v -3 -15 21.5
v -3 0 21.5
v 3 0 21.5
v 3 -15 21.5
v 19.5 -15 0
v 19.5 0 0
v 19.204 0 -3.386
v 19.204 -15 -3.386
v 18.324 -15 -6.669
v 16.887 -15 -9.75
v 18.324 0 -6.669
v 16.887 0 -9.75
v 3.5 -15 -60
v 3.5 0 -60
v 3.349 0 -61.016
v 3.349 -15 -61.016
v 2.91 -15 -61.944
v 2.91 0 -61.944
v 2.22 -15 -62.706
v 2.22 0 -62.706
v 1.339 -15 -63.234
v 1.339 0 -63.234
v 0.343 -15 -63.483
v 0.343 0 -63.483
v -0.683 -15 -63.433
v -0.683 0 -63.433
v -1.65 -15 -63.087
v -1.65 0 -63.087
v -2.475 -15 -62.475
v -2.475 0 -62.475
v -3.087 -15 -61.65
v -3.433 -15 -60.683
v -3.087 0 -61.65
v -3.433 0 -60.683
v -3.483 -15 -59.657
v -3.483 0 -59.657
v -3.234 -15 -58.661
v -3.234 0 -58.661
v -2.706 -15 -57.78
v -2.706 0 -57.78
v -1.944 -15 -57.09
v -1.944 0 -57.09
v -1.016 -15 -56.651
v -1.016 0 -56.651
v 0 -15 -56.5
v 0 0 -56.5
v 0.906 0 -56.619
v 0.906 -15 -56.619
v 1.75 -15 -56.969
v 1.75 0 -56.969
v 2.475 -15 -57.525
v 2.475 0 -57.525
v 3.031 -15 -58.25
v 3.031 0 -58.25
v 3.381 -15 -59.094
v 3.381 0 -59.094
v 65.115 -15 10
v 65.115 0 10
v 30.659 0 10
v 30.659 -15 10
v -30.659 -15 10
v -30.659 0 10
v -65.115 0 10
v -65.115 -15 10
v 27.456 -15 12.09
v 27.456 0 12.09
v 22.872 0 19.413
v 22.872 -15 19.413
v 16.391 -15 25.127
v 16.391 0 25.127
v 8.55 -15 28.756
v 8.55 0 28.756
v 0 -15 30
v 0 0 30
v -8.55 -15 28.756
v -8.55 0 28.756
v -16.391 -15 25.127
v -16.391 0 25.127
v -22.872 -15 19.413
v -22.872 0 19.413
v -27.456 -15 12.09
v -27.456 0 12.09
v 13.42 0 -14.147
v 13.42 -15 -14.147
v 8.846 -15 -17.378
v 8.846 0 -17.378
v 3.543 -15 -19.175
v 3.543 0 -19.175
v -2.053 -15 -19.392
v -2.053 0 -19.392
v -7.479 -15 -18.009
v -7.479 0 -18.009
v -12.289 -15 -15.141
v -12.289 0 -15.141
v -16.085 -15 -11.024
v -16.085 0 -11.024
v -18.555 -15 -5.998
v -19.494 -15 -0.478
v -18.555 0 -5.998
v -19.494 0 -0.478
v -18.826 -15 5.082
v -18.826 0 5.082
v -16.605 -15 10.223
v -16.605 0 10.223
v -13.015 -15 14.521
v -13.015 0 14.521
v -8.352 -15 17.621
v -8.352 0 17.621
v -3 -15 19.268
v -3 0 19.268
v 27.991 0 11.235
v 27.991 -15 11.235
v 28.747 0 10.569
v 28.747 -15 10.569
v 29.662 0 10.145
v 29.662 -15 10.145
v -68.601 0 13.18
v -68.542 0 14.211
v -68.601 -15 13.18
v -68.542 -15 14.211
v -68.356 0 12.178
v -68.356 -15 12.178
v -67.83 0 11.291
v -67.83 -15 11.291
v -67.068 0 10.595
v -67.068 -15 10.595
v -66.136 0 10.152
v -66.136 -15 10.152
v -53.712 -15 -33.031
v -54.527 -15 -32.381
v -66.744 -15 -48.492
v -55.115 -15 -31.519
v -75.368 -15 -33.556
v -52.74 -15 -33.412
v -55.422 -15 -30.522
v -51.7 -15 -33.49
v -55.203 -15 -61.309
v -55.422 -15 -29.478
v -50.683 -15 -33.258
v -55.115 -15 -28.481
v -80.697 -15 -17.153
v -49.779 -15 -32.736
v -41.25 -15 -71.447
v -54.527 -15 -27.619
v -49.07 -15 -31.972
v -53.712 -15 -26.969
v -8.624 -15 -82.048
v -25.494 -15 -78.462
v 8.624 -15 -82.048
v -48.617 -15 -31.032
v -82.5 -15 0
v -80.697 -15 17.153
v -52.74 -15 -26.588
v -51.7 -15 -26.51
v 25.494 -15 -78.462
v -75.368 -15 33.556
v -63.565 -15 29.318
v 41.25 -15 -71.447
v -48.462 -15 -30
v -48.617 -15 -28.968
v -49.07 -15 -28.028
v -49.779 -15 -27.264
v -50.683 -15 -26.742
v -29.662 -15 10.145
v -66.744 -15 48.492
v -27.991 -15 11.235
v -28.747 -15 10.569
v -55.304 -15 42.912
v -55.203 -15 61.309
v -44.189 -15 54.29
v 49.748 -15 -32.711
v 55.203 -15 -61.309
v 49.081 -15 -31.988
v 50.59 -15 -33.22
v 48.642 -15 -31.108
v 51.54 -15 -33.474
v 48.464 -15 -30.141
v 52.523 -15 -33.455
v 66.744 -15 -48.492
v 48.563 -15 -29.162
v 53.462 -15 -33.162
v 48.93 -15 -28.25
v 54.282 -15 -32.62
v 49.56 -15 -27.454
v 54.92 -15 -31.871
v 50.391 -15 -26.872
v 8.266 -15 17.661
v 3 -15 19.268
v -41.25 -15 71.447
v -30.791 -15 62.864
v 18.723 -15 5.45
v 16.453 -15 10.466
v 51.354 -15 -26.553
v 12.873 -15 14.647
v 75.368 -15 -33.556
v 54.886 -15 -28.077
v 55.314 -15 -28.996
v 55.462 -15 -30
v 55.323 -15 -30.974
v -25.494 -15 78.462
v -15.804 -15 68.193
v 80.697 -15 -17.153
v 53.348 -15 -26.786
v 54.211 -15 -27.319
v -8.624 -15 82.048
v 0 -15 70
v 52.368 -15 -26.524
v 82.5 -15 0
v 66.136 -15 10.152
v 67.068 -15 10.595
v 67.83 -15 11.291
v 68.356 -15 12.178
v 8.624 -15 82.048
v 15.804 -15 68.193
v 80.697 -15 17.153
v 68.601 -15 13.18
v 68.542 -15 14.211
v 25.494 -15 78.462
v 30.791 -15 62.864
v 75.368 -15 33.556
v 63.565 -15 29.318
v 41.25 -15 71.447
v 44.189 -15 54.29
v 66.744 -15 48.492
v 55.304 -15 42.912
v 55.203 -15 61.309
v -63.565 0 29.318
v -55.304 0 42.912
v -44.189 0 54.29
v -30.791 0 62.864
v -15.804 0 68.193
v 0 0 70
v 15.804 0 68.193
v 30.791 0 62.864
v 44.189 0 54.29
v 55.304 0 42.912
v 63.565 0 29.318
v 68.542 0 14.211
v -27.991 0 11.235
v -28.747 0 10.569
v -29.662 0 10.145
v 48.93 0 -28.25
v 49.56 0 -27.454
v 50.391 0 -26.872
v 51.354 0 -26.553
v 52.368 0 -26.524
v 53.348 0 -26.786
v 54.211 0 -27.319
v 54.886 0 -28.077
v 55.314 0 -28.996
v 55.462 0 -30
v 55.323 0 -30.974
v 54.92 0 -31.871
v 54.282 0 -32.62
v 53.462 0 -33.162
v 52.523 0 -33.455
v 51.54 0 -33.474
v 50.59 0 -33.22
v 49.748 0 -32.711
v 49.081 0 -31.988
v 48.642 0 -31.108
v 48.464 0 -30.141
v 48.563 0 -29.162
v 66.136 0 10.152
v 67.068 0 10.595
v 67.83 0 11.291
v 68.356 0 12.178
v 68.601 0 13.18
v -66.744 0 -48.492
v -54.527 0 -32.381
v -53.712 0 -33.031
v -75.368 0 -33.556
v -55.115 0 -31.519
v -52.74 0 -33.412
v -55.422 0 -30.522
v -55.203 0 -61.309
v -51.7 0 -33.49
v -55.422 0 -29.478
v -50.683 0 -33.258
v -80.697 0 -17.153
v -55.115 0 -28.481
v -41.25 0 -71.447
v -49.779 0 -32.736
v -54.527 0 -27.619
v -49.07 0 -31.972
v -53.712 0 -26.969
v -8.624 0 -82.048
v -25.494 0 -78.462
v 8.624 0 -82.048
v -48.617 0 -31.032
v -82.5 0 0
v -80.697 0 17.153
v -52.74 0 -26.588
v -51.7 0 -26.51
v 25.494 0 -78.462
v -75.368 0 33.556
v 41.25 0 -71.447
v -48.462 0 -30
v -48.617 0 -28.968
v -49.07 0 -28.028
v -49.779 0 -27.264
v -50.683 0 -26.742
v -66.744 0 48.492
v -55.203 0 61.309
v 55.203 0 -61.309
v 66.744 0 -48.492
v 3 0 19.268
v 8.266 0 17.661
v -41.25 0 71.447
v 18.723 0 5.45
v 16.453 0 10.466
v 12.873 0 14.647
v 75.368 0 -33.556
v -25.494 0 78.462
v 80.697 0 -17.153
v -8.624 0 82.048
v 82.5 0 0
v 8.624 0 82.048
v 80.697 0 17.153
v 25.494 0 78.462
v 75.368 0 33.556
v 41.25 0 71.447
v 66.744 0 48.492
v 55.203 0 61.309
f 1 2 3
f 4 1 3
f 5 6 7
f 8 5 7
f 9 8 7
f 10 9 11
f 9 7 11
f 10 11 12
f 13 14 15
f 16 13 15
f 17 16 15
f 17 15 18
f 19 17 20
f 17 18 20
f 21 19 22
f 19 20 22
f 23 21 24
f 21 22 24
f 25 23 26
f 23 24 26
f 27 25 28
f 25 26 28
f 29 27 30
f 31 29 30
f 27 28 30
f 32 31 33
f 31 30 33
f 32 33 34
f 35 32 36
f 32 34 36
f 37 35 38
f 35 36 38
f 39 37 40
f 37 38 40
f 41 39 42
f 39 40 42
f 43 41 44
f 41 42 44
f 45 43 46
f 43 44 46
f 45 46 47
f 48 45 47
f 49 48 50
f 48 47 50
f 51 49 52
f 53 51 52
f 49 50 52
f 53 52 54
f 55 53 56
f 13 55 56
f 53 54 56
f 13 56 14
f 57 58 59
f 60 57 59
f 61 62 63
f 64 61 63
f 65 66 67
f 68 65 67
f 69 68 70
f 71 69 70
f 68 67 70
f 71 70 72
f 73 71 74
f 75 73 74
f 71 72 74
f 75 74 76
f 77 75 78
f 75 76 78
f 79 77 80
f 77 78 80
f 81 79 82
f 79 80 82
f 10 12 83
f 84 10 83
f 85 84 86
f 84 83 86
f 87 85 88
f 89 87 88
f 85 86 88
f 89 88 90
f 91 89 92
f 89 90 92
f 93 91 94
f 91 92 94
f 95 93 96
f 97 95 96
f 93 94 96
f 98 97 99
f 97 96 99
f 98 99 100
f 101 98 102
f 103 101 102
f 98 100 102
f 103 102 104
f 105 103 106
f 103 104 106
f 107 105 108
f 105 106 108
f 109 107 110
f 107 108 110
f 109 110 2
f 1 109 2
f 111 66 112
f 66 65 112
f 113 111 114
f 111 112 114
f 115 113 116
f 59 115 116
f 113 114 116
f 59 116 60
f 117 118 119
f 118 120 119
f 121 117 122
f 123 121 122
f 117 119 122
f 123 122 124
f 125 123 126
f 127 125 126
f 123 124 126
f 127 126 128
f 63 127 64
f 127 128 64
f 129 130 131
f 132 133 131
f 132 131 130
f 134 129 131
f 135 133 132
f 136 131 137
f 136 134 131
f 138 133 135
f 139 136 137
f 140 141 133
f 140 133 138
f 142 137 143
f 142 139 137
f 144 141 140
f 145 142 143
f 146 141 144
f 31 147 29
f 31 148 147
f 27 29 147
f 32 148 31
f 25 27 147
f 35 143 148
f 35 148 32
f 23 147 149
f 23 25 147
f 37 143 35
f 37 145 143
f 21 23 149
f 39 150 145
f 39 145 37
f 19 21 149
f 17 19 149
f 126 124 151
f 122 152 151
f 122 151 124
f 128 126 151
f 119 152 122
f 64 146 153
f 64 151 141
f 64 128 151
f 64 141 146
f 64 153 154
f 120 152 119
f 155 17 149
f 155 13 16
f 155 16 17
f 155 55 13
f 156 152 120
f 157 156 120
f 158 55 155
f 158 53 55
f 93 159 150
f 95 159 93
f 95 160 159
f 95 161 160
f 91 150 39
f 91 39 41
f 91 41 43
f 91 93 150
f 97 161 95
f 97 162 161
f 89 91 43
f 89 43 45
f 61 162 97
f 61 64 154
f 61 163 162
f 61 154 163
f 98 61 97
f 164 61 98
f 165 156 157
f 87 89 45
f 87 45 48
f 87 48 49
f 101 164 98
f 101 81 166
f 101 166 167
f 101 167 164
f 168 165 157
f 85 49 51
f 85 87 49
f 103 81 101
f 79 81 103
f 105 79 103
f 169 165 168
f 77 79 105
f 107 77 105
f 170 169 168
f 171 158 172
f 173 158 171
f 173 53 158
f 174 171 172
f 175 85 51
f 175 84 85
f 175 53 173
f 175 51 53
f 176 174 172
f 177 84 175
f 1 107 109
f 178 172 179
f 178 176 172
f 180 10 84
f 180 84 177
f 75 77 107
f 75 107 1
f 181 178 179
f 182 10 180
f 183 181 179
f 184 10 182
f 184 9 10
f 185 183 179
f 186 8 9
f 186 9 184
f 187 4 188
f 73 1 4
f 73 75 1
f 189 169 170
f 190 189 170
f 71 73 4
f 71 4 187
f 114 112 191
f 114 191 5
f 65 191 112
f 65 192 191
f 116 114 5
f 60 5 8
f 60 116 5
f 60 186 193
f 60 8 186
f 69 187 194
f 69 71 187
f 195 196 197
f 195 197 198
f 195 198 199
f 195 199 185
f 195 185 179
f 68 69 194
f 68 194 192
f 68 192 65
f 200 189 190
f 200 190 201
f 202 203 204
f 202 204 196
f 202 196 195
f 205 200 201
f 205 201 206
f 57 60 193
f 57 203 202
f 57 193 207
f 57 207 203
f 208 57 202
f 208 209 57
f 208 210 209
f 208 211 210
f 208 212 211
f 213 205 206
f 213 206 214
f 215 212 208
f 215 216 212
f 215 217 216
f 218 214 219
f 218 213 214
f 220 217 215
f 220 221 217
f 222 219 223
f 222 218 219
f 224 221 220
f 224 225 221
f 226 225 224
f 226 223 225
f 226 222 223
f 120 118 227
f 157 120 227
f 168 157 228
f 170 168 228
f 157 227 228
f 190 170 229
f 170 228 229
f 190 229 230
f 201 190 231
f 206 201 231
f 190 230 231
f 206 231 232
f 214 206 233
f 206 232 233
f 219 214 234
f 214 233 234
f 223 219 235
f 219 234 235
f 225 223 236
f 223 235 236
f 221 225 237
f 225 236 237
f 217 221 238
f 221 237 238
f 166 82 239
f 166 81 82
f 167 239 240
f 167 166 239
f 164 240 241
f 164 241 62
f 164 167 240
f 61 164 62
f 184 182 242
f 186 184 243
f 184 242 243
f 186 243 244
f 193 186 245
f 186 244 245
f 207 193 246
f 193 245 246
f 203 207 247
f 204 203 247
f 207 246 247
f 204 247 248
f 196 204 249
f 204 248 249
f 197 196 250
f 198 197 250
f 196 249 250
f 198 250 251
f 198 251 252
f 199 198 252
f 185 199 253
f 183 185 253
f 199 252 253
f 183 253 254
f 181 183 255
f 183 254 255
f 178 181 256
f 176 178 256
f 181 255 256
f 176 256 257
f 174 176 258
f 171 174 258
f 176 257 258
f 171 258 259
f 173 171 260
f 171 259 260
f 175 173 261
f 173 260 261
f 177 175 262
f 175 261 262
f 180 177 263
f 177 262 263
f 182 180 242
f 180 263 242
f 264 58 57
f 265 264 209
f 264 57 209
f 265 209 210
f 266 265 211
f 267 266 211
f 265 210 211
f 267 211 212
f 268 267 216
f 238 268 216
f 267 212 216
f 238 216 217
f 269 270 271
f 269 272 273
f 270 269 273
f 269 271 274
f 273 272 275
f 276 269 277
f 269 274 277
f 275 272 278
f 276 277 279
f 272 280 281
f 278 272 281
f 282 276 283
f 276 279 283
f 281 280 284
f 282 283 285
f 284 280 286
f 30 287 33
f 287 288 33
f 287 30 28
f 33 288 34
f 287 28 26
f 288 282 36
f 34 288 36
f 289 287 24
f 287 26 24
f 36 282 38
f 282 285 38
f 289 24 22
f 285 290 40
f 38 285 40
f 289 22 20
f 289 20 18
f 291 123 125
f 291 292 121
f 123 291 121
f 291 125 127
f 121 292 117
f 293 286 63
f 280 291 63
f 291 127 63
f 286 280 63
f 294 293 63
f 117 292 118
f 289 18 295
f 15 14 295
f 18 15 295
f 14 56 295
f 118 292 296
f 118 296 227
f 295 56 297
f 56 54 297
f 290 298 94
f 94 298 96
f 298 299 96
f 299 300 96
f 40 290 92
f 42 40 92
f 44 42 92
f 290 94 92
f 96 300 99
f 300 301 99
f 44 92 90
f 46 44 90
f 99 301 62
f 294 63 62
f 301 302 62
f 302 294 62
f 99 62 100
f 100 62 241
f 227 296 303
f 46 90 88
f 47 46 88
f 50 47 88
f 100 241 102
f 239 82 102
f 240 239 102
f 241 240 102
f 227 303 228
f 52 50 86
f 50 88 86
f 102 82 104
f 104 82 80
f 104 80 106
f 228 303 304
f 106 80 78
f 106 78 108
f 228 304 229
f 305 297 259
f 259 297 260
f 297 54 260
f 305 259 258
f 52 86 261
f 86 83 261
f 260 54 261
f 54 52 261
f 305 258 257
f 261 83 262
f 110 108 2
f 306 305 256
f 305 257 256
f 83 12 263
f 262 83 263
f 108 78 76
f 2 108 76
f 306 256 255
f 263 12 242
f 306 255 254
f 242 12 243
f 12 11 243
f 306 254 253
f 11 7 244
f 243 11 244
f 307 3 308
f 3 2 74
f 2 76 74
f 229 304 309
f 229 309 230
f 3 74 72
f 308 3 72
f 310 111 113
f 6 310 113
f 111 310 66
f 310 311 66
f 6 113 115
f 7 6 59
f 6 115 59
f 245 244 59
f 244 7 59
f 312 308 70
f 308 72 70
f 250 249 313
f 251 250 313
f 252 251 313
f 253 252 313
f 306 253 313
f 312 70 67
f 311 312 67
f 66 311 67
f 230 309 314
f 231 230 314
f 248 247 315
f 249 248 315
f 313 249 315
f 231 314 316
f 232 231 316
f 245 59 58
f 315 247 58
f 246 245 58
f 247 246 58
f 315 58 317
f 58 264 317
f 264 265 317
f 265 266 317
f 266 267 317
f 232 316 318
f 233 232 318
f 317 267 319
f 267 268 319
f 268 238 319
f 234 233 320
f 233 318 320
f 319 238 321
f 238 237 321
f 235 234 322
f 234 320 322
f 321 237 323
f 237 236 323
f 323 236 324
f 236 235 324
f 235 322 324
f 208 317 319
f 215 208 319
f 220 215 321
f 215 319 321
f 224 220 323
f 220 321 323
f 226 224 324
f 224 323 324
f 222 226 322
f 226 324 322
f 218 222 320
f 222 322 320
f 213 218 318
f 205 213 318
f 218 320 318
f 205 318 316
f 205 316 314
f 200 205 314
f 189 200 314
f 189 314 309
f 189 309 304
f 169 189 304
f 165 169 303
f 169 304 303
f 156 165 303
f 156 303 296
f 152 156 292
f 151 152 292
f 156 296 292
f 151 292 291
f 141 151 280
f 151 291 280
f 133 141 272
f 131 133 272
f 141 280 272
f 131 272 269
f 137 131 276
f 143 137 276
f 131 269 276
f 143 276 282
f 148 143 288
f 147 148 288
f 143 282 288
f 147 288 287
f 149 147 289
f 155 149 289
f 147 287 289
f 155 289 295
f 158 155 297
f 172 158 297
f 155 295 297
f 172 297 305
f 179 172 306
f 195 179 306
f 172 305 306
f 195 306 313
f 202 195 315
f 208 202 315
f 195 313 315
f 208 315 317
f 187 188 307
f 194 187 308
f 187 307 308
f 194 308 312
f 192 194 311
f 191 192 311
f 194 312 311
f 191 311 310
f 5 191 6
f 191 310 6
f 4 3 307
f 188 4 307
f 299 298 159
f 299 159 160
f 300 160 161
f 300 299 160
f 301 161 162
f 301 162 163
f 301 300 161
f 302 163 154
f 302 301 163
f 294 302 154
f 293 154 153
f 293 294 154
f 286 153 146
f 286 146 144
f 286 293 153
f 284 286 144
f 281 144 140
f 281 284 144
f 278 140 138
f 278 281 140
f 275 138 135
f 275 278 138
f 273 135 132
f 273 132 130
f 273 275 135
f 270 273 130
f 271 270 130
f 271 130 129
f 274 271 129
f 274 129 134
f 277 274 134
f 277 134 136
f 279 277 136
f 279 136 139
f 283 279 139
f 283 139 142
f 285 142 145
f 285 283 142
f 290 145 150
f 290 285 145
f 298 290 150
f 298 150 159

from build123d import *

# Parameters (mm, degrees)
F0_R     = 82.5
F0_R_2   = 3.5
F1_DEPTH = 15
F2_R     = 3.5


with BuildPart() as f1:
    # F0 (on Front) → F1 (new body)
    with BuildSketch(Plane.XZ):
        Circle(F0_R)
        with Locations((-51.961524, -30)):
            Circle(F0_R_2, mode=Mode.SUBTRACT)
        with BuildLine():
            ThreePointArc((0, -56.5), (2.474874, -57.525126), (3.5, -60))
            ThreePointArc((3.5, -60), (-2.474874, -62.474874), (0, -56.5))
        make_face(mode=Mode.SUBTRACT)
        with BuildLine():
            ThreePointArc((55.461524, -30), (51.055658, -33.38074), (48.930435, -28.25))
            ThreePointArc((48.930435, -28.25), (52.867391, -26.61926), (55.461524, -30))
        make_face(mode=Mode.SUBTRACT)
        with BuildLine():
            ThreePointArc((19.5, 0), (18.835554, -5.046971), (16.887495, -9.75))
            ThreePointArc((16.887495, -9.75), (-16.084916, -11.02386), (-3, 19.267849))
            Line((-3, 19.267849), (-3, 21.5))
            Line((-3, 21.5), (0, 21.5))
            Line((0, 21.5), (3, 21.5))
            Line((3, 21.5), (3, 19.267849))
            ThreePointArc((3, 19.267849), (14.811313, 12.683651), (19.5, 0))
        make_face(mode=Mode.SUBTRACT)
        with BuildLine():
            Line((-28.284271, 10), (-69.282032, 10))
            ThreePointArc((-69.282032, 10), (0, 70), (69.282032, 10))
            Line((69.282032, 10), (28.284271, 10))
            ThreePointArc((28.284271, 10), (0, 30), (-28.284271, 10))
        make_face(mode=Mode.SUBTRACT)
    extrude(amount=F1_DEPTH)

    # F2
    f2_edges = [f1.edges().sort_by_distance(p)[0] for p in [
        (69.282032, -7.5, 10),
        (-69.282032, -7.5, 10),
        (-28.284271, -7.5, 10),
        (28.284271, -7.5, 10),
    ]]
    fillet(f2_edges, radius=F2_R)


solid = f1.part
